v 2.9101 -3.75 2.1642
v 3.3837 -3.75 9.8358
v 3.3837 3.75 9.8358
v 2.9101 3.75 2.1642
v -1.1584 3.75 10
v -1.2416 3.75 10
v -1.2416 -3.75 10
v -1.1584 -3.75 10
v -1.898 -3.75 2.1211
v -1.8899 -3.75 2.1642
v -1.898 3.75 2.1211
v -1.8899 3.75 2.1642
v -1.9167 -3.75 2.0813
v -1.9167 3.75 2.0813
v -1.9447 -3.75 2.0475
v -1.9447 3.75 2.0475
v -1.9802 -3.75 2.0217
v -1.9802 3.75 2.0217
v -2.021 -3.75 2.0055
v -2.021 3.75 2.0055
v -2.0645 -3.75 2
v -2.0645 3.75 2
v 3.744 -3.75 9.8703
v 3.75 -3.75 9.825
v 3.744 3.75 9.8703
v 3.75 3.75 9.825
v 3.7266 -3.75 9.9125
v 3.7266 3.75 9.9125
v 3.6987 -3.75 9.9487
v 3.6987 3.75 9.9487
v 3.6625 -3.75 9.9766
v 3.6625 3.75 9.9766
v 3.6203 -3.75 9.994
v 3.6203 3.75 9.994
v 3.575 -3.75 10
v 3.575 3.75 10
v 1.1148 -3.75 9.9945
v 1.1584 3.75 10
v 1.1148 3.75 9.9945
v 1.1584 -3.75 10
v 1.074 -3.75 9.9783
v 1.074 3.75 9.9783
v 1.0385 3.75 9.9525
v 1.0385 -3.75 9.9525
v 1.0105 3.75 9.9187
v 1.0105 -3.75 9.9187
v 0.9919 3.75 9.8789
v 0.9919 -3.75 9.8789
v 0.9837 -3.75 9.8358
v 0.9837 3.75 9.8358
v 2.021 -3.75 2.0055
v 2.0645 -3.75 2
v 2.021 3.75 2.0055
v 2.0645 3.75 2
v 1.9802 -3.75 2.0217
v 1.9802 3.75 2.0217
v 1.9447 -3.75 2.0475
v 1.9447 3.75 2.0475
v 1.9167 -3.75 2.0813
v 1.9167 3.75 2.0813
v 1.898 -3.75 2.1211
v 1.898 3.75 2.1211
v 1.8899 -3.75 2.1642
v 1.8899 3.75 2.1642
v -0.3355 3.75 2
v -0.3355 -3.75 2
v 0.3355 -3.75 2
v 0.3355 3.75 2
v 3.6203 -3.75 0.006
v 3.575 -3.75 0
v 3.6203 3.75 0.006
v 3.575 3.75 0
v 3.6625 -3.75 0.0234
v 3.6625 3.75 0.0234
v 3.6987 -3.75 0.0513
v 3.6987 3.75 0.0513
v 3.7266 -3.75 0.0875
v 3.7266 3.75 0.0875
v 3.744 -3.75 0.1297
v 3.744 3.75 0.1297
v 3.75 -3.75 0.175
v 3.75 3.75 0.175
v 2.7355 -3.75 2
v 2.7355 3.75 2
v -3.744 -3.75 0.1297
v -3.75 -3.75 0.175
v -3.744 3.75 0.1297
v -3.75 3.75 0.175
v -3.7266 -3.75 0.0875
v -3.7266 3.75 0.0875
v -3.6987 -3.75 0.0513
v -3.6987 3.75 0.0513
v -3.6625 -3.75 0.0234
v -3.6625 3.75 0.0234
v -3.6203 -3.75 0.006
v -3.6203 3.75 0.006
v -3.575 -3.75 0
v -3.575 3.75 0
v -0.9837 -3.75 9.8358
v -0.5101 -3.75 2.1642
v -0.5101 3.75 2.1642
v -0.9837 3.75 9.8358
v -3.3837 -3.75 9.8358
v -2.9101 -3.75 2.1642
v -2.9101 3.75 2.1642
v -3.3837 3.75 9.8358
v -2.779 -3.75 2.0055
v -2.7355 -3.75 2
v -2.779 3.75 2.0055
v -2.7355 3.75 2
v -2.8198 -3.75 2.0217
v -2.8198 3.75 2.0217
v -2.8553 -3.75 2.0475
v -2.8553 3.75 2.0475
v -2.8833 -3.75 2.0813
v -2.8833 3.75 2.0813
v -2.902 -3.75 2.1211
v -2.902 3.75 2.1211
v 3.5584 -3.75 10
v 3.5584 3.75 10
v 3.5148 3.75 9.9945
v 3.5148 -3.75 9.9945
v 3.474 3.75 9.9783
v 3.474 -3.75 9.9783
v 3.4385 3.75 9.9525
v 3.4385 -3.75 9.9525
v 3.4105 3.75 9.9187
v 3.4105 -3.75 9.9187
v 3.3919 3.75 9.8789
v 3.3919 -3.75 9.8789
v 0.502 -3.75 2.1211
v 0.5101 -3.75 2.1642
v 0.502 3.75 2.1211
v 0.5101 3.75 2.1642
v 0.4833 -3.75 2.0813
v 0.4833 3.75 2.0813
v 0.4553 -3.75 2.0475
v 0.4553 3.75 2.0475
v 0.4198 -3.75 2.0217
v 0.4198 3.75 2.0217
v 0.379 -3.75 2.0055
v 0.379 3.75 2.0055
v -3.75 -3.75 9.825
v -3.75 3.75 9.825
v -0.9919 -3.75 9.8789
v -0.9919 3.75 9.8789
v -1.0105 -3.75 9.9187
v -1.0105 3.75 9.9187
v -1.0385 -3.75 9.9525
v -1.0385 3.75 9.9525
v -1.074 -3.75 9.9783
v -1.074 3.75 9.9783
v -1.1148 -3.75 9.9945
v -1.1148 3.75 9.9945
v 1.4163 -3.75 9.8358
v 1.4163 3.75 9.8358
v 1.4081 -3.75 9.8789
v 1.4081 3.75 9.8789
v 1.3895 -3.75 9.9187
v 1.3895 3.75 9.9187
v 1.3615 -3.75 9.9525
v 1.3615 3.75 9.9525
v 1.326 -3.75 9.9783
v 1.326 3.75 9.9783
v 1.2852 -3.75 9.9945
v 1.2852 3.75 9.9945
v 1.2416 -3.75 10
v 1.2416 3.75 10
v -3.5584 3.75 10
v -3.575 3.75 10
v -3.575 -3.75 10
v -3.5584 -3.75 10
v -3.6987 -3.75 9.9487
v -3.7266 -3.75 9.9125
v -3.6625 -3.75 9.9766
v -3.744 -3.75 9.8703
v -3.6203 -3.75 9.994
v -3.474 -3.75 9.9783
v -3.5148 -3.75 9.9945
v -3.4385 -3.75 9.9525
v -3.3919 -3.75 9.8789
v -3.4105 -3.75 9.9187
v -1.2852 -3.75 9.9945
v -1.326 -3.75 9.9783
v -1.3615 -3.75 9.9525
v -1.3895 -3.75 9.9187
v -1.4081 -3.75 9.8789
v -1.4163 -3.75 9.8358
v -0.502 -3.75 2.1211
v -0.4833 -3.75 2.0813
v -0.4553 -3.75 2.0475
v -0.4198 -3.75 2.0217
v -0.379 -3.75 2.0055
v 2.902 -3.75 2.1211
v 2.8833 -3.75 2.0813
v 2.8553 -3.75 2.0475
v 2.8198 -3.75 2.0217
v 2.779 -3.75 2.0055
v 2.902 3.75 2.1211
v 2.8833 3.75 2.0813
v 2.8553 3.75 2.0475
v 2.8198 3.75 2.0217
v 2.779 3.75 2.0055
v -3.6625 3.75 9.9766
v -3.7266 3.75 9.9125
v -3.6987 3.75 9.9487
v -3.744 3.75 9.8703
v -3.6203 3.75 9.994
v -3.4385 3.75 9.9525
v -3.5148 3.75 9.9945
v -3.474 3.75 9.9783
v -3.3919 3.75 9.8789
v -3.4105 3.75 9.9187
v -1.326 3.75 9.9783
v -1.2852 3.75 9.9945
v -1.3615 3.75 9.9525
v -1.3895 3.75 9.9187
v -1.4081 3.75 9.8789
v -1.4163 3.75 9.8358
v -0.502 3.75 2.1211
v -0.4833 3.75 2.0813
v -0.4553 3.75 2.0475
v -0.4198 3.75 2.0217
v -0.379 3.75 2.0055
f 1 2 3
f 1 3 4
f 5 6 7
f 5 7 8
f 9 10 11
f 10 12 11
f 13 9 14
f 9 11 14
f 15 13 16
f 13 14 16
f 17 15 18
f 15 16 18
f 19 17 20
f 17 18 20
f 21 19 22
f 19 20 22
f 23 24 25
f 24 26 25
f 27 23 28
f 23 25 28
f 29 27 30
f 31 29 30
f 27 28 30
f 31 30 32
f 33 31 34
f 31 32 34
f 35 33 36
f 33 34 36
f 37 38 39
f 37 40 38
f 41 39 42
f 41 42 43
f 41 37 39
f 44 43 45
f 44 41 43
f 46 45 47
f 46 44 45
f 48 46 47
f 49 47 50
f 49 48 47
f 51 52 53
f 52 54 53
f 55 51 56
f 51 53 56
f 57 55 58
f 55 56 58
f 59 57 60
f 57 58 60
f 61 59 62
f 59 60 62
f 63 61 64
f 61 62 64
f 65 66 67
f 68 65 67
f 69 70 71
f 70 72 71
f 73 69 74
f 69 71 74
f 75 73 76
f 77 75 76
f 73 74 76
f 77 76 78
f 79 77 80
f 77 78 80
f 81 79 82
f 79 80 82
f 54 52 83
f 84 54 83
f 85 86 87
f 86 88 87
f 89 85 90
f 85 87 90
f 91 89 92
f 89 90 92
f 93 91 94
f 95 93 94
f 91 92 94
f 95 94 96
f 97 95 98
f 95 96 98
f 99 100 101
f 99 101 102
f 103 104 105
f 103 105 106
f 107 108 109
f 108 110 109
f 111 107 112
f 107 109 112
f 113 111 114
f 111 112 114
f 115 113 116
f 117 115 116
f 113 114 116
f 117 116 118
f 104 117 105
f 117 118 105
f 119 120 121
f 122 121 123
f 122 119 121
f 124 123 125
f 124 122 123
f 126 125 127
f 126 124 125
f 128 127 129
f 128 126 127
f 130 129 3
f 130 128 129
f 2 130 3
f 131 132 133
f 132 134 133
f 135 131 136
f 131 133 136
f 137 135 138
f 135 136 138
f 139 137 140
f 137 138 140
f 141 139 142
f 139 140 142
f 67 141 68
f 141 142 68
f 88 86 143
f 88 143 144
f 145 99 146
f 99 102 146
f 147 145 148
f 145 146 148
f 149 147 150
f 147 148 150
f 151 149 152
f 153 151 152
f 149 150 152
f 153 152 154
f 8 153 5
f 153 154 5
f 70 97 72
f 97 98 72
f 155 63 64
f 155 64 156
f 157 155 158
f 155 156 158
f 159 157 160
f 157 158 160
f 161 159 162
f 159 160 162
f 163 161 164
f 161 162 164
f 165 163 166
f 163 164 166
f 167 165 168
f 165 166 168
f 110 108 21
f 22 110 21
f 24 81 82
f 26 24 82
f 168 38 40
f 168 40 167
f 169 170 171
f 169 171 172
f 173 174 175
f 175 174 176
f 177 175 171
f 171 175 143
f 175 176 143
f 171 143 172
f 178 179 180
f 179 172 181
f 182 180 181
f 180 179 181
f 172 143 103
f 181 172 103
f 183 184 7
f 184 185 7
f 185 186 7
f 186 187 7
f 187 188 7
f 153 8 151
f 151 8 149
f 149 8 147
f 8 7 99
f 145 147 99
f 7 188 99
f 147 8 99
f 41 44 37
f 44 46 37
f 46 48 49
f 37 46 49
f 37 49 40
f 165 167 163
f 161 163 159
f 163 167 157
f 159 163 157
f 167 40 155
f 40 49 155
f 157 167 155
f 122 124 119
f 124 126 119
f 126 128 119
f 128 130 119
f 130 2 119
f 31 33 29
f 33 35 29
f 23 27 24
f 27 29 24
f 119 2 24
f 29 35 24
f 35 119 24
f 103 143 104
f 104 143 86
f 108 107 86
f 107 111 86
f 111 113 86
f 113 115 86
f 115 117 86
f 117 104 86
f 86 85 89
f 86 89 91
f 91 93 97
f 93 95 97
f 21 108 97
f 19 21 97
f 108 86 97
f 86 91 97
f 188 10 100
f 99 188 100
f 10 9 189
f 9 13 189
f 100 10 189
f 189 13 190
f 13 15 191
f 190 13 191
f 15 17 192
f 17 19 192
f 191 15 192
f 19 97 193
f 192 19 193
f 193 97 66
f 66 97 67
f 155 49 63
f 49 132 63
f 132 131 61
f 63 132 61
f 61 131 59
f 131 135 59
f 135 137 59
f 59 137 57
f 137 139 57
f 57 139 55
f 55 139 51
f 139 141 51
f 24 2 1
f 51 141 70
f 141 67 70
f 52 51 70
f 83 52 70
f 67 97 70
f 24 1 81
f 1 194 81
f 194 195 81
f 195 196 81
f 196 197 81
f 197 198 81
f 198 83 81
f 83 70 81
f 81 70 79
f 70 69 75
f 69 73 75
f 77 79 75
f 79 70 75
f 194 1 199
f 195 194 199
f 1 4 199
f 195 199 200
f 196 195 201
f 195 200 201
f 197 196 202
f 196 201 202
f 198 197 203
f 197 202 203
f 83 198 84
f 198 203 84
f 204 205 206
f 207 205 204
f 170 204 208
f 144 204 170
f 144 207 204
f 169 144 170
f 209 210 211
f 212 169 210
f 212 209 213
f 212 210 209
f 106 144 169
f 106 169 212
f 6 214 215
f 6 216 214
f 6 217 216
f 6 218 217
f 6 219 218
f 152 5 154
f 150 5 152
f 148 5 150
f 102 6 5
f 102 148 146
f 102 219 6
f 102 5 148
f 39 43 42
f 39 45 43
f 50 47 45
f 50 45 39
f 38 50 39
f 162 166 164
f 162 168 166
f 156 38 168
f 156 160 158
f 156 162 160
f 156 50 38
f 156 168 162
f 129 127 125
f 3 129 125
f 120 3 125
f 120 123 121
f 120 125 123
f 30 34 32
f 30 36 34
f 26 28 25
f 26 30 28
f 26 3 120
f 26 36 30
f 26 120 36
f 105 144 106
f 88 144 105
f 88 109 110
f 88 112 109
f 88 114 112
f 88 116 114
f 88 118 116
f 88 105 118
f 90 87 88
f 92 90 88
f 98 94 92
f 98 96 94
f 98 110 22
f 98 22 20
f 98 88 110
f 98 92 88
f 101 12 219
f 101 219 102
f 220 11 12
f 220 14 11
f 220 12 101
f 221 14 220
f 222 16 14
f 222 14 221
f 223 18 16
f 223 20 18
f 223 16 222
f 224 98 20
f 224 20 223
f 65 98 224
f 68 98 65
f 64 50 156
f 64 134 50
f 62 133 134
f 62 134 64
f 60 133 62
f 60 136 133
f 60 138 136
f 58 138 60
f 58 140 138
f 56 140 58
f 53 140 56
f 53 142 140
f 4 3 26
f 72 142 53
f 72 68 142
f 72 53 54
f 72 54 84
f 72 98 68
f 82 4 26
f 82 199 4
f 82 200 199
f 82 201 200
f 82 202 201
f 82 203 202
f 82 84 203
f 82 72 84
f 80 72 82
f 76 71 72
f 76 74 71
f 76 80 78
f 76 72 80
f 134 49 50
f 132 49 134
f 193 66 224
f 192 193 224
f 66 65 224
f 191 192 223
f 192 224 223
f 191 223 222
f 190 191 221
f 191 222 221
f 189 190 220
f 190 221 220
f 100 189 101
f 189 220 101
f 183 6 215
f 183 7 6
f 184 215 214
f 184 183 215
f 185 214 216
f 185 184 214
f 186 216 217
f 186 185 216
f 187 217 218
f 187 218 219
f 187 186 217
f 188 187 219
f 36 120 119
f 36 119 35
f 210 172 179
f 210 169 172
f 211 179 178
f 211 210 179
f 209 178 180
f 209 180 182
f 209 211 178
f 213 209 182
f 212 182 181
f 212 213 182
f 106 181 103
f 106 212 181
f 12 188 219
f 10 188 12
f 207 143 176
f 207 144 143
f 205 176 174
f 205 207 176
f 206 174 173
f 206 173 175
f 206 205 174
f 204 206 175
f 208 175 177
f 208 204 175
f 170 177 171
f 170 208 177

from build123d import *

# Parameters (mm, degrees)
SKETCH_W               = 7.5
SKETCH_H               = 7.5
PAD_DEPTH              = 10
POCKET_DEPTH           = 7.501
LINEARPATTERN_COUNT    = 2
LINEARPATTERN_PITCH    = 2.4
LINEARPATTERN001_COUNT = 2
LINEARPATTERN001_PITCH = 2.4
FILLET_R               = 0.175


with BuildPart() as part:
    # Sketch → Pad (new body)
    with BuildSketch(Plane.XY):
        Rectangle(SKETCH_W, SKETCH_H)
    extrude(amount=PAD_DEPTH)

    # Sketch001 (on Face2 of Pad) → Pocket (cut, through all)
    with BuildSketch(Plane.XZ.offset(3.75)):
        Polygon((-1, 10.1), (0, 10.1), (1, 10.1), (0.5, 2), (0, 2), (-0.5, 2), align=None)
    pocket = extrude(amount=-POCKET_DEPTH, mode=Mode.SUBTRACT)

    # LinearPattern: Pocket ×2
    with Locations(*[(i * LINEARPATTERN_PITCH, 0, 0) for i in range(1, LINEARPATTERN_COUNT)]):
        add(pocket, mode=Mode.SUBTRACT)

    # LinearPattern001: Pocket ×2
    with Locations(*[(-i * LINEARPATTERN001_PITCH, 0, 0) for i in range(1, LINEARPATTERN001_COUNT)]):
        add(pocket, mode=Mode.SUBTRACT)

    # Fillet
    fillet_edges = [part.edges().sort_by_distance(p)[0] for p in [
        (-3.75, 0, 10),
        (-3.393827, 0, 10),
        (-1.406173, 0, 10),
        (-0.993827, 0, 10),
        (0.993827, 0, 10),
        (1.406173, 0, 10),
        (3.393827, 0, 10),
        (3.75, 0, 10),
        (-2.9, 0, 2),
        (-0.5, 0, 2),
        (1.9, 0, 2),
        (3.75, 0, 0),
        (-3.75, 0, 0),
        (-1.9, 0, 2),
        (0.5, 0, 2),
        (2.9, 0, 2),
    ]]
    fillet(fillet_edges, radius=FILLET_R)


solid = part.part
